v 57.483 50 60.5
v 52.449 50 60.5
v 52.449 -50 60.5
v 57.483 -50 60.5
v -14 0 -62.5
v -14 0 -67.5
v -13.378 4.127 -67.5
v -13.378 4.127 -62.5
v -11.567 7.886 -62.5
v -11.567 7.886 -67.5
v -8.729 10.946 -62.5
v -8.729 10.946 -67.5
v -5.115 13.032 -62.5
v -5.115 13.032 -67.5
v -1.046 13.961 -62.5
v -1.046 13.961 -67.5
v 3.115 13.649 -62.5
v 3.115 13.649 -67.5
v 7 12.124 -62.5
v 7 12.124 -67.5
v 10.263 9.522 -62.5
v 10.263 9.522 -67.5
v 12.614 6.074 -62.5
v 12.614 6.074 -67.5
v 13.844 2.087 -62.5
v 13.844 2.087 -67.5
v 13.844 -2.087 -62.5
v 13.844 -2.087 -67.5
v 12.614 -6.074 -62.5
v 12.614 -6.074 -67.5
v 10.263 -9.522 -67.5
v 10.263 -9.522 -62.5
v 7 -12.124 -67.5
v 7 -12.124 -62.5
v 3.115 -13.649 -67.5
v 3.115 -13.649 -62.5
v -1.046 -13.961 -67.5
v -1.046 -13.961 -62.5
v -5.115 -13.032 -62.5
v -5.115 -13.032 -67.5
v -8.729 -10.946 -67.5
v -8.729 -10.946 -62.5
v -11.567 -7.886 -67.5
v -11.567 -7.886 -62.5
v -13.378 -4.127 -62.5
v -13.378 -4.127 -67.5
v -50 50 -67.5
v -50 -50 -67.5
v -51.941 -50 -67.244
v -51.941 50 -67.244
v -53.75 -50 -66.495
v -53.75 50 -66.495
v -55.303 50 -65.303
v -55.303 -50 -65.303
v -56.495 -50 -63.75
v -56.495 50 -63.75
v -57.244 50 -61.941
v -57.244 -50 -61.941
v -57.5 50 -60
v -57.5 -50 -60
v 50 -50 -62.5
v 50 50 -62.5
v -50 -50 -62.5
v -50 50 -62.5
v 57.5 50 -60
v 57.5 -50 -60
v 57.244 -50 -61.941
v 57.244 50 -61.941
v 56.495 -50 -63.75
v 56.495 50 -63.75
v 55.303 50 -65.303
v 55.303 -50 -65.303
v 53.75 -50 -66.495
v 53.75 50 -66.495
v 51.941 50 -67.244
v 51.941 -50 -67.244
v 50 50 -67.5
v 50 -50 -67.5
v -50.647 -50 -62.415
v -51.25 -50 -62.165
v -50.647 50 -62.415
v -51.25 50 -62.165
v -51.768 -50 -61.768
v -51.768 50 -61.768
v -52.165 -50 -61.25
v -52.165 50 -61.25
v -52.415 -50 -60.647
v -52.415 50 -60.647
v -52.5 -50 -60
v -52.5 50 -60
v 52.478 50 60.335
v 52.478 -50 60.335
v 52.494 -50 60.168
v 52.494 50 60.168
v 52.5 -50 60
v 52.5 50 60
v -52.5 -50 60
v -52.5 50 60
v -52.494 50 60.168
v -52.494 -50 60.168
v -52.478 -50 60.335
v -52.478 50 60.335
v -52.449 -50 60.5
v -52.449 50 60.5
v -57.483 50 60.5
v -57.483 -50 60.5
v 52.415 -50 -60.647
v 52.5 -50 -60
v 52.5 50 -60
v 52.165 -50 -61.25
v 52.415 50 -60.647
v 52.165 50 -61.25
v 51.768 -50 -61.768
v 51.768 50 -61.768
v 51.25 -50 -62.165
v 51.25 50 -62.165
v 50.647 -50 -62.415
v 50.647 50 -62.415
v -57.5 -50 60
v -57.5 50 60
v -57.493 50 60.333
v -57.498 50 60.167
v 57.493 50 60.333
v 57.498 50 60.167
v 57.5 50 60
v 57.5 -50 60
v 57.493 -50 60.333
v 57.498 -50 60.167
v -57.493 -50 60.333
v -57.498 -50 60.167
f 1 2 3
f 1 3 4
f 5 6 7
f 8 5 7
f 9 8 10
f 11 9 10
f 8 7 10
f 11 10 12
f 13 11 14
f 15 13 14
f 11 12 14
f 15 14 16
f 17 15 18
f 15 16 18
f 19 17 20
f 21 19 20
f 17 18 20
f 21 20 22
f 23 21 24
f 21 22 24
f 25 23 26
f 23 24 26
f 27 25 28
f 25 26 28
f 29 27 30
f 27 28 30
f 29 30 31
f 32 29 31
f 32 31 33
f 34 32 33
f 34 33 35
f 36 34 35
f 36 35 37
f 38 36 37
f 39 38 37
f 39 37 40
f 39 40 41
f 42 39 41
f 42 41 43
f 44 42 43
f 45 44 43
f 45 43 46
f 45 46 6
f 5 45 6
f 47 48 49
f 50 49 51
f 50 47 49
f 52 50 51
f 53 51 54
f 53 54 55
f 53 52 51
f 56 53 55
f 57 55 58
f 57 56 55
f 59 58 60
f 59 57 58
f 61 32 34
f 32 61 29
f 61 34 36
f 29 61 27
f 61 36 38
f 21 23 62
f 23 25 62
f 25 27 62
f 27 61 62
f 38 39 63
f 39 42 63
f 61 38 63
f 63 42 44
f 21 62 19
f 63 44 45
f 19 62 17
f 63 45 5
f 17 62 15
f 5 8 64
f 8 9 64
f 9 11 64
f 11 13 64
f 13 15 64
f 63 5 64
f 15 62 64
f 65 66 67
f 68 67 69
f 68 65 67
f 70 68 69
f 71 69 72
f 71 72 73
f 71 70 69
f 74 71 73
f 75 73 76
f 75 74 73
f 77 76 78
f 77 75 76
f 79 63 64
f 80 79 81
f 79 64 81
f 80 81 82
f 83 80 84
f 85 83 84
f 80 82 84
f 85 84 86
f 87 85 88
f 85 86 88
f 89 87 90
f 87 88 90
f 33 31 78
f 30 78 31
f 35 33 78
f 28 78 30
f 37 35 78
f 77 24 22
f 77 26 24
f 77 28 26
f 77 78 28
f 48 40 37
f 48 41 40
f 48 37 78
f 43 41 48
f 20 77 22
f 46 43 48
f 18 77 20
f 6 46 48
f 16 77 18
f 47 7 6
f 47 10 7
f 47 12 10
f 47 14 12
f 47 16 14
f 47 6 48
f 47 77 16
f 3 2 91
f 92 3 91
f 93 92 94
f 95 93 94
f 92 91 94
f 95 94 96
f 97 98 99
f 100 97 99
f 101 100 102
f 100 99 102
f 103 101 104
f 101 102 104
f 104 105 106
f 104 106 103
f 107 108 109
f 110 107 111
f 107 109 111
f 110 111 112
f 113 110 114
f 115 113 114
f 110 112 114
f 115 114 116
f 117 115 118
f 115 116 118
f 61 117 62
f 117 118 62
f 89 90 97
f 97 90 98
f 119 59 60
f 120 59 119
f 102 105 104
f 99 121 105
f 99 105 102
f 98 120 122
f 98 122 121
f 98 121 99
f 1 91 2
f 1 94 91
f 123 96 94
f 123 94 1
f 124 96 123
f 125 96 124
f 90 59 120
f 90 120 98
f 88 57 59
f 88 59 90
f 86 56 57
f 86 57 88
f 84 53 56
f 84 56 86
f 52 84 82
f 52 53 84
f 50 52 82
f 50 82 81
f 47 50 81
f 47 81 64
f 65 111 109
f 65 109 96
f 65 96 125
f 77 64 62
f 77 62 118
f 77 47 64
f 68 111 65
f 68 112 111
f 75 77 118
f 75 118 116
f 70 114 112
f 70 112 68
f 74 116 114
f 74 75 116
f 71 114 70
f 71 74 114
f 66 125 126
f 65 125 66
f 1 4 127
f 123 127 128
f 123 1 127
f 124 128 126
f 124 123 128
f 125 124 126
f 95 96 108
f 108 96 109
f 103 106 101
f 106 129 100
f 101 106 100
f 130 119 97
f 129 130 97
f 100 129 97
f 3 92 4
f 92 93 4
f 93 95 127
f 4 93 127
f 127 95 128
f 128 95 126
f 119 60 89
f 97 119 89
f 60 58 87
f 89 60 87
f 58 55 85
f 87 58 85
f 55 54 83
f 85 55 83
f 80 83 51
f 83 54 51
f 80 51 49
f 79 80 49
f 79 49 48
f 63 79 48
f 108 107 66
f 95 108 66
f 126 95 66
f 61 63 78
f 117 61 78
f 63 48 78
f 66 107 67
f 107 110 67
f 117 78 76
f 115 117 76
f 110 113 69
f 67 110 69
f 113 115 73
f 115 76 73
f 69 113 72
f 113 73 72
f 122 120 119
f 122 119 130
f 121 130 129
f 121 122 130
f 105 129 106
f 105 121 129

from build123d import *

# Parameters (mm, degrees)
EXTRUDE_THIN1_DEPTH = 50
SKETCH3_R           = 14
CUT_EXTRUDE2_DEPTH  = 10
CUT_EXTRUDE3_REACH  = 135.651
SKETCH4_W           = 129.958556301
SKETCH4_H           = 19.187259519


with BuildPart() as part:
    # Sketch1 → Extrude-Thin1 (new, symmetric)
    with BuildSketch(Plane(origin=(0, 0, 0), x_dir=(1, 0, 0), z_dir=(0, 1, 0))):
        with BuildLine():
            Line((-57.5, 60), (-57.5, -60))
            ThreePointArc((-57.5, -60), (-55.303300859, -65.303300859), (-50, -67.5))
            Line((-50, -67.5), (50, -67.5))
            ThreePointArc((50, -67.5), (55.303300859, -65.303300859), (57.5, -60))
            Line((57.5, -60), (57.5, 60))
            ThreePointArc((57.5, 60), (55.303300859, 65.303300859), (50, 67.5))
            Line((50, 67.5), (-50, 67.5))
            ThreePointArc((-50, 67.5), (-55.303300859, 65.303300859), (-57.5, 60))
        make_face()
        with BuildLine():
            Line((-52.5, 60), (-52.5, -60))
            ThreePointArc((-52.5, -60), (-51.767766953, -61.767766953), (-50, -62.5))
            Line((-50, -62.5), (50, -62.5))
            ThreePointArc((50, -62.5), (51.767766953, -61.767766953), (52.5, -60))
            Line((52.5, -60), (52.5, 60))
            ThreePointArc((52.5, 60), (51.767766953, 61.767766953), (50, 62.5))
            Line((50, 62.5), (-50, 62.5))
            ThreePointArc((-50, 62.5), (-51.767766953, 61.767766953), (-52.5, 60))
        make_face(mode=Mode.SUBTRACT)
    extrude(amount=EXTRUDE_THIN1_DEPTH, both=True)

    # Sketch3 → Cut-Extrude2 (cut)
    with BuildSketch(Plane(origin=(0, 0, -67.5), x_dir=(-1, 0, 0), z_dir=(0, 0, -1))):
        Circle(SKETCH3_R)
    extrude(amount=-CUT_EXTRUDE2_DEPTH, mode=Mode.SUBTRACT)

    # Sketch4 → Cut-Extrude3 (cut, up to next)
    with BuildSketch(Plane(origin=(0, 50, 0), x_dir=(1, 0, 0), z_dir=(0, 1, 0)), mode=Mode.PRIVATE) as cut_extrude3_sk1:
        with Locations((-6.555772869, -70.09362976)):
            Rectangle(SKETCH4_W, SKETCH4_H)
    cut_extrude3_tool1 = extrude(cut_extrude3_sk1.sketch, amount=-CUT_EXTRUDE3_REACH, mode=Mode.PRIVATE) & part.part
    add(cut_extrude3_tool1.solids().sort_by_distance((-6.555773, 50, 70.09363))[0], mode=Mode.SUBTRACT)


solid = part.part
